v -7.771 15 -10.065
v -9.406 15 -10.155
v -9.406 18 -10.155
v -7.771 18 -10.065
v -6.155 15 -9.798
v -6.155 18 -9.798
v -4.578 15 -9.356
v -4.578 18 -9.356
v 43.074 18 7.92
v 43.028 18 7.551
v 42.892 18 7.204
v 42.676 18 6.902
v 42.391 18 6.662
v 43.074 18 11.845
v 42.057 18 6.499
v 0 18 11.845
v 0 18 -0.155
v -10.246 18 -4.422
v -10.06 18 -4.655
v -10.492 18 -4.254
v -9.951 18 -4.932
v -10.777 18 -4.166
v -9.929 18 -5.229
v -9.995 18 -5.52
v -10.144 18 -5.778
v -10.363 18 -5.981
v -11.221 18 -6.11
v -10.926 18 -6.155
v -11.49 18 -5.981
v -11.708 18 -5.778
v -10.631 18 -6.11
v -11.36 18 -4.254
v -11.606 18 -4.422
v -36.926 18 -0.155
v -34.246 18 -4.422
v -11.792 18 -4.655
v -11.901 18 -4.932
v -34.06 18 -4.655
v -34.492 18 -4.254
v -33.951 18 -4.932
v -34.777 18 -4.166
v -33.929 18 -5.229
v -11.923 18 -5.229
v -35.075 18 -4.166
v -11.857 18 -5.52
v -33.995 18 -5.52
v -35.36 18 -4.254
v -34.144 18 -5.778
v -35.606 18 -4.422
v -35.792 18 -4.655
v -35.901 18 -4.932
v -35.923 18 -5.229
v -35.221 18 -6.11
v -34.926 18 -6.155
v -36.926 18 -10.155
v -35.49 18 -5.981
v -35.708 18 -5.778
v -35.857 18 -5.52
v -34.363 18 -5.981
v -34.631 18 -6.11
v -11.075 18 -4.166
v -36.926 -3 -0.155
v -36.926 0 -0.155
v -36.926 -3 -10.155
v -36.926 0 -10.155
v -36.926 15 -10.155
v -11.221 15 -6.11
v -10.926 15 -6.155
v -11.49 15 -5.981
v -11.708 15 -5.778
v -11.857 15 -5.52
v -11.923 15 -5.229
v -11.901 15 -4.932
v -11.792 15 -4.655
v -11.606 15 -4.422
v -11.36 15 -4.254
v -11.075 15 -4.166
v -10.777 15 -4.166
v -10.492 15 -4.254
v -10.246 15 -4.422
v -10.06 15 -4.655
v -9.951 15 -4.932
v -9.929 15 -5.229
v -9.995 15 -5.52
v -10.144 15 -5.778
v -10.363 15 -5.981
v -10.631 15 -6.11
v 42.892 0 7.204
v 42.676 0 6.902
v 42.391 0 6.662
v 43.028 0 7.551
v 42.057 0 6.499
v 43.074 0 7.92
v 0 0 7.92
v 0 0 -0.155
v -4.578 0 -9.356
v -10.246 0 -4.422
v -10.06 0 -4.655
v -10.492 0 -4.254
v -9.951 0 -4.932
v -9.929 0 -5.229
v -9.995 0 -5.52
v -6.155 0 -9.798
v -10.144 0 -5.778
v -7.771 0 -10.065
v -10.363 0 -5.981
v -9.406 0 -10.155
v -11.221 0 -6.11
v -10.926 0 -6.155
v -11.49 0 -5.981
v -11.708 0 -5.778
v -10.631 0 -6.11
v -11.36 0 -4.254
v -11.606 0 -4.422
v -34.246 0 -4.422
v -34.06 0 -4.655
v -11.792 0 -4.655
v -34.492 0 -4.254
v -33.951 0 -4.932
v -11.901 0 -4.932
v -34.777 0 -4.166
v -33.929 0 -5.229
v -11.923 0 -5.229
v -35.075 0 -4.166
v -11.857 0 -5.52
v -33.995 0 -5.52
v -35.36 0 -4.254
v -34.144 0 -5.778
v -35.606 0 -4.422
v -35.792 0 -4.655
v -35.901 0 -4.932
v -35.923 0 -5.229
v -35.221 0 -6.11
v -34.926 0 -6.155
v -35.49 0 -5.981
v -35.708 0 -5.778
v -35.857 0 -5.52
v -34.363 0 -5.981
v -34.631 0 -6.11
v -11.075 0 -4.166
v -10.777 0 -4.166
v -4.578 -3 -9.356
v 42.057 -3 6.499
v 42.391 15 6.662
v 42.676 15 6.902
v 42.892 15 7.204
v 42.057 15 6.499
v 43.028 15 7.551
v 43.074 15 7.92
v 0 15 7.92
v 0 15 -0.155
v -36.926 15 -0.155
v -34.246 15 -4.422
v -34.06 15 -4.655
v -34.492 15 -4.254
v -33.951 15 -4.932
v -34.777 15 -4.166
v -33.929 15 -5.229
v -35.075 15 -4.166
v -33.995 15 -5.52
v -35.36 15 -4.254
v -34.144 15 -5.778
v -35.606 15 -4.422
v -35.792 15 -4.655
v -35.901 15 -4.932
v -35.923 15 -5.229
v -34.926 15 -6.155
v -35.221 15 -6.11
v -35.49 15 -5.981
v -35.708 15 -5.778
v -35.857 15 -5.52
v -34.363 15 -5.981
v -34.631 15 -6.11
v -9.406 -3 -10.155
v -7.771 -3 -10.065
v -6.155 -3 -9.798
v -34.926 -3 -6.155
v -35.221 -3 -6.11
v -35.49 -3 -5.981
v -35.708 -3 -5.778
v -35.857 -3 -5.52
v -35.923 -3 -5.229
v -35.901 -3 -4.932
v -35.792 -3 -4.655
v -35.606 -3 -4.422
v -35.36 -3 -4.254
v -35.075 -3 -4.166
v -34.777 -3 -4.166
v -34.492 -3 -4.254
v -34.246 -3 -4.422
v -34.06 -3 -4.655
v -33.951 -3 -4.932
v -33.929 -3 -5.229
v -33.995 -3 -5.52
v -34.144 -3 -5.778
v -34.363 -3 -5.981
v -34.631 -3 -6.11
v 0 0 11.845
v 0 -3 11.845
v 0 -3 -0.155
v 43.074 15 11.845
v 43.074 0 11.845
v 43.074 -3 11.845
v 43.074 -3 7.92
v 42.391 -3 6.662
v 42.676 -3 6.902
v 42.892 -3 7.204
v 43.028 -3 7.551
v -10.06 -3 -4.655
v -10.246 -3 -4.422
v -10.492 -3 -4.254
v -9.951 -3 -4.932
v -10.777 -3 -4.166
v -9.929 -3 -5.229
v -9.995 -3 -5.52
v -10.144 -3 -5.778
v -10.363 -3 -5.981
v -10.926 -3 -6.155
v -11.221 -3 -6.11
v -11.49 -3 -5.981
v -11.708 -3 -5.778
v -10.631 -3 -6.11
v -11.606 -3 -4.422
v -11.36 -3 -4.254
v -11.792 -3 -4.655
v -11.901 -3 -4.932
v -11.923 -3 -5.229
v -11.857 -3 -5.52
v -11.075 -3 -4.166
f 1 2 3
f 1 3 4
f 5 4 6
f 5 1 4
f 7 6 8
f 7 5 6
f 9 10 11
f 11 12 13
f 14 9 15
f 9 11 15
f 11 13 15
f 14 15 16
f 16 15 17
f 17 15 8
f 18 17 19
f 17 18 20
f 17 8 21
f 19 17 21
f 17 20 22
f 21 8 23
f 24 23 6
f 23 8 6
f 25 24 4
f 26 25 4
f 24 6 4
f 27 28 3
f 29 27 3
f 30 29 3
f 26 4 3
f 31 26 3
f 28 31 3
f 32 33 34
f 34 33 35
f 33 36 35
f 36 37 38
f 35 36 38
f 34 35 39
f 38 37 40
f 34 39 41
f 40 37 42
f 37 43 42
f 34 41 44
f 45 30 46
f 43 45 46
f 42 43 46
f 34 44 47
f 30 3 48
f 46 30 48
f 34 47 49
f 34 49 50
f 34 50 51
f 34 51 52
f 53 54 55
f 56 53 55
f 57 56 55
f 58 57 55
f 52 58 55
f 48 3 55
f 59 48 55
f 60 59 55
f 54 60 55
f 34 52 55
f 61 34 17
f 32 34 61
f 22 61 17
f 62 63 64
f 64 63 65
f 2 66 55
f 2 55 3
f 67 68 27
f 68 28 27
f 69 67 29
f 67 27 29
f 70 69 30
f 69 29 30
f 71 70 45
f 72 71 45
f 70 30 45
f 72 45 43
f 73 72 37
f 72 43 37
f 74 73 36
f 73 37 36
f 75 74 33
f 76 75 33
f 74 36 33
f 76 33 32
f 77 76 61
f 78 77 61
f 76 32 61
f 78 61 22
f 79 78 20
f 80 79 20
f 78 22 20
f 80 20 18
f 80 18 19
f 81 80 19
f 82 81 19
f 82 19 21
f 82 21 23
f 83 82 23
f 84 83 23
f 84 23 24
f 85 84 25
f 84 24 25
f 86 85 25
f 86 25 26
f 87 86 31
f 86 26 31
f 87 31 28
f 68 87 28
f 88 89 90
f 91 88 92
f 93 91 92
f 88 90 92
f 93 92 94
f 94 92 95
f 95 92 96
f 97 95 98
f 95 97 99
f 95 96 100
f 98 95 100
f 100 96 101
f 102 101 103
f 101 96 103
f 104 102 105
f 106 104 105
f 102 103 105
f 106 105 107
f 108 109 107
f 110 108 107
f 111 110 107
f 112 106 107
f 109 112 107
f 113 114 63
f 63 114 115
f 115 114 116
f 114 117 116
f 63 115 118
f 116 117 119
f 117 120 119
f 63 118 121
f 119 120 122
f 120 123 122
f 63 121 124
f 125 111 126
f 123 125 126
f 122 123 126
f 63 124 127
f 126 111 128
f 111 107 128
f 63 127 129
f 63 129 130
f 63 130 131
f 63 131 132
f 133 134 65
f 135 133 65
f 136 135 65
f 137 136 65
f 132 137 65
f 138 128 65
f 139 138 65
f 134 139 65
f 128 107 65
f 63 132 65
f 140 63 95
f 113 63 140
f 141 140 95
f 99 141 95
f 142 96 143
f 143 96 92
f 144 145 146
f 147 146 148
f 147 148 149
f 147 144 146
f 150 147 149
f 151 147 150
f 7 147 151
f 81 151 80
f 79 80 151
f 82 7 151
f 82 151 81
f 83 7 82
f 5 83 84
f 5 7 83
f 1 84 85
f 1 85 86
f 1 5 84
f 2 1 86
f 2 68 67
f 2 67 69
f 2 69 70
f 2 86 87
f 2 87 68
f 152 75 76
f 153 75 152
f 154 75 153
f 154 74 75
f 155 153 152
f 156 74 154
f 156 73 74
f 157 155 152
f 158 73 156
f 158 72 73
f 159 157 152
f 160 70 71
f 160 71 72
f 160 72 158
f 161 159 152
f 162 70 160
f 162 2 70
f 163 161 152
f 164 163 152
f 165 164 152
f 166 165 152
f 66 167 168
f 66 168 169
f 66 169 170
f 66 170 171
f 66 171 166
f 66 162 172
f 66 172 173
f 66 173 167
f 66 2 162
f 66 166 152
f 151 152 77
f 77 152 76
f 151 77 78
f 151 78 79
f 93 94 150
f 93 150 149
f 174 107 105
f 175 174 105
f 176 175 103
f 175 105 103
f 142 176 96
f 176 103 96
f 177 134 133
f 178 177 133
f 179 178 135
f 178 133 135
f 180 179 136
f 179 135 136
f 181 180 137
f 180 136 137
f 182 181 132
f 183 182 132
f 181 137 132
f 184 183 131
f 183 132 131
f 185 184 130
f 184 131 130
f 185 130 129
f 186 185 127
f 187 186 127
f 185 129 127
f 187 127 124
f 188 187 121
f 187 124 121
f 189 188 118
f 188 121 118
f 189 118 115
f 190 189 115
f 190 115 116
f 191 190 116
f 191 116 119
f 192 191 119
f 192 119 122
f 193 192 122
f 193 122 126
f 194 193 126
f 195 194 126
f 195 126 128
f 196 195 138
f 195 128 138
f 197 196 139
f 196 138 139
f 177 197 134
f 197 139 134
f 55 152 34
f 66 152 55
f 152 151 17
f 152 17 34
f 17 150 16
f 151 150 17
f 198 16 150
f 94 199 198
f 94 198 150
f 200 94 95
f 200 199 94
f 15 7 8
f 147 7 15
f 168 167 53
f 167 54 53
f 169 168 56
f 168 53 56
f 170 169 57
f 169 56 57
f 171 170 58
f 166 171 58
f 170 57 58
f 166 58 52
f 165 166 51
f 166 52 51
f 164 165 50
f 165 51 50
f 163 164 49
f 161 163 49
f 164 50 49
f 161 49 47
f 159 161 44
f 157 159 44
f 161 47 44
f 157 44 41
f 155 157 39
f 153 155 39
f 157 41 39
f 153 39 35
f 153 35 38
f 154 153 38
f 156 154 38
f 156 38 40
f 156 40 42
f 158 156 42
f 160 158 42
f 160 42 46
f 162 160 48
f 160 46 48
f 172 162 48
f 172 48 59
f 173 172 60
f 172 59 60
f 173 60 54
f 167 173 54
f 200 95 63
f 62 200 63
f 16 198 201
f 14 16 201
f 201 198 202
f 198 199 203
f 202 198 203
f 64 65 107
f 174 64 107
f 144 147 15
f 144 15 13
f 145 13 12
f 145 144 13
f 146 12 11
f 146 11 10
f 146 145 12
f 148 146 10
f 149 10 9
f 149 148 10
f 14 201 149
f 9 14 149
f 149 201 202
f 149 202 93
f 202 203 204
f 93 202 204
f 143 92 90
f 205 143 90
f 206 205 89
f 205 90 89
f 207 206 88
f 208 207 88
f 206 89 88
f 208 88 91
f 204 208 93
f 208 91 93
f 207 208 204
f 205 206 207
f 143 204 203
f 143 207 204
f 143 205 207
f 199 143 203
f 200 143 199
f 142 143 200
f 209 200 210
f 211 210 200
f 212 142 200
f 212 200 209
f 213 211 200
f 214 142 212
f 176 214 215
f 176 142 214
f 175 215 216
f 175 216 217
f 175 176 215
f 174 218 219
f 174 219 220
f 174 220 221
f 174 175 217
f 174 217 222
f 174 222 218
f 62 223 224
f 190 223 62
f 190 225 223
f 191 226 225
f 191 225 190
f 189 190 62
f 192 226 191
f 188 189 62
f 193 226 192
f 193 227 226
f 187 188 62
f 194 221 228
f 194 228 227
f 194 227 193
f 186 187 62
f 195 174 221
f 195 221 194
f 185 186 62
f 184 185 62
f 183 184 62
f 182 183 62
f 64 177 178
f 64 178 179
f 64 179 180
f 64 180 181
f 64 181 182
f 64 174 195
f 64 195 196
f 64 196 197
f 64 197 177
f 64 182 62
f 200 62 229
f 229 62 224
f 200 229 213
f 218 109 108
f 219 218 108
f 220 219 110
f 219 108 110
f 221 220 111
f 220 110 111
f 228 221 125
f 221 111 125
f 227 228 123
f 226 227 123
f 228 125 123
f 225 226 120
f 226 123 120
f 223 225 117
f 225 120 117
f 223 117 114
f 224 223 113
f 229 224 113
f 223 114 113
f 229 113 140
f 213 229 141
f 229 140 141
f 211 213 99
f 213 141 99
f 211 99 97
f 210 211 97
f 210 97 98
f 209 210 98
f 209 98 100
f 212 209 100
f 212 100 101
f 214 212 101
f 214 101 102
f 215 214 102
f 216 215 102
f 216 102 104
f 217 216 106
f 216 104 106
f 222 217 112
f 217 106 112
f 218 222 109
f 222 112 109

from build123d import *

# Parameters (mm, degrees)
BOSS_EXTRUDE1_DEPTH                      = 3
BOSS_EXTRUDE2_START                      = 15
BOSS_EXTRUDE2_DEPTH                      = 3
SKETCH3_W                                = 1
SKETCH3_H                                = 21
F_2_0MM_CLEARANCE_DOWEL_HOLE1_AT_2_COUNT = 2
F_2_0MM_CLEARANCE_DOWEL_HOLE1_AT_2_PITCH = 24
SKETCH5_W                                = 43.073811931
SKETCH5_H                                = 3.925670489
BOSS_EXTRUDE3_DEPTH                      = 15


with BuildPart() as part:
    # Sketch1 → Boss-Extrude1 (new body)
    with BuildSketch(Plane(origin=(0, 0, 0), x_dir=(1, 0, 0), z_dir=(0, 1, 0))):
        with BuildLine():
            Line((-4.577926811, 9.356292891), (42.056666031, -6.499468675))
            ThreePointArc((42.056666031, -6.499468675), (42.793295664, -7.04620955), (43.073811931, -7.919627792))
            Line((43.073811931, -7.919627792), (43.073811931, -11.845298281))
            Line((43.073811931, -11.845298281), (0, -11.845298281))
            Line((0, -11.845298281), (0, 0.154701719))
            Line((0, 0.154701719), (-36.926188069, 0.154701719))
            Line((-36.926188069, 0.154701719), (-36.926188069, 10.154701719))
            Line((-36.926188069, 10.154701719), (-9.406467809, 10.154701719))
            ThreePointArc((-9.406467809, 10.154701719), (-6.959415254, 9.953753506), (-4.577926811, 9.356292891))
        make_face()
    extrude(amount=-BOSS_EXTRUDE1_DEPTH)


with BuildPart() as body_2:
    # Sketch1<2> → Boss-Extrude2 (new body)
    with BuildSketch(Plane(origin=(0, 0, 0), x_dir=(1, 0, 0), z_dir=(0, 1, 0)).offset(BOSS_EXTRUDE2_START)):
        with BuildLine():
            Line((-4.577926811, 9.356292891), (42.056666031, -6.499468675))
            ThreePointArc((42.056666031, -6.499468675), (42.793295664, -7.04620955), (43.073811931, -7.919627792))
            Line((43.073811931, -7.919627792), (43.073811931, -11.845298281))
            Line((43.073811931, -11.845298281), (0, -11.845298281))
            Line((0, -11.845298281), (0, 0.154701719))
            Line((0, 0.154701719), (-36.926188069, 0.154701719))
            Line((-36.926188069, 0.154701719), (-36.926188069, 10.154701719))
            Line((-36.926188069, 10.154701719), (-9.406467809, 10.154701719))
            ThreePointArc((-9.406467809, 10.154701719), (-6.959415254, 9.953753506), (-4.577926811, 9.356292891))
        make_face()
    extrude(amount=BOSS_EXTRUDE2_DEPTH)


with BuildPart() as f_2_0mm_clearance_dowel_hole1_tool:
    # Sketch3 → Ø2.0mm Clearance Dowel Hole1 (revolve)
    with BuildSketch(Plane(origin=(-34.926188069, -3, -5.154701719), x_dir=(0, 0, -1), z_dir=(1, 0, 0))):
        with Locations((0.5, 10.5)):
            Rectangle(SKETCH3_W, SKETCH3_H)
    f_2_0mm_clearance_dowel_hole1 = revolve(axis=Axis((-34.926188069, -9.35, -5.154701719), (0, 1, 0)))


with BuildPart() as part_1:
    add(part.part)

    # Ø2.0mm Clearance Dowel Hole1: cut by f_2_0mm_clearance_dowel_hole1_tool
    add(f_2_0mm_clearance_dowel_hole1_tool.part, mode=Mode.SUBTRACT)


with BuildPart() as body_2_1:
    add(body_2.part)

    # Ø2.0mm Clearance Dowel Hole1: cut by f_2_0mm_clearance_dowel_hole1_tool
    add(f_2_0mm_clearance_dowel_hole1_tool.part, mode=Mode.SUBTRACT)


with BuildPart() as f_2_0mm_clearance_dowel_hole1_at_2_tool:
    # Ø2.0mm Clearance Dowel Hole1 at 2: Ø2.0mm Clearance Dowel Hole1 ×2
    with Locations(*[(i * F_2_0MM_CLEARANCE_DOWEL_HOLE1_AT_2_PITCH, 0, 0) for i in range(1, F_2_0MM_CLEARANCE_DOWEL_HOLE1_AT_2_COUNT)]):
        add(f_2_0mm_clearance_dowel_hole1)


with BuildPart() as part_2:
    add(part_1.part)

    # Ø2.0mm Clearance Dowel Hole1 at 2: cut by f_2_0mm_clearance_dowel_hole1_at_2_tool
    add(f_2_0mm_clearance_dowel_hole1_at_2_tool.part, mode=Mode.SUBTRACT)



with BuildPart() as body_2_2:
    add(body_2_1.part)

    # Ø2.0mm Clearance Dowel Hole1 at 2: cut by f_2_0mm_clearance_dowel_hole1_at_2_tool
    add(f_2_0mm_clearance_dowel_hole1_at_2_tool.part, mode=Mode.SUBTRACT)


with BuildPart() as part_3:
    add(part_2.part)

    add(body_2_2.part)  # Boss-Extrude3 merges body 2
    # Sketch5 → Boss-Extrude3 (add)
    with BuildSketch(Plane(origin=(0, 0, 0), x_dir=(1, 0, 0), z_dir=(0, 1, 0))):
        with Locations((21.536905966, -9.882463037)):
            Rectangle(SKETCH5_W, SKETCH5_H)
    extrude(amount=BOSS_EXTRUDE3_DEPTH)


solid = part_3.part
